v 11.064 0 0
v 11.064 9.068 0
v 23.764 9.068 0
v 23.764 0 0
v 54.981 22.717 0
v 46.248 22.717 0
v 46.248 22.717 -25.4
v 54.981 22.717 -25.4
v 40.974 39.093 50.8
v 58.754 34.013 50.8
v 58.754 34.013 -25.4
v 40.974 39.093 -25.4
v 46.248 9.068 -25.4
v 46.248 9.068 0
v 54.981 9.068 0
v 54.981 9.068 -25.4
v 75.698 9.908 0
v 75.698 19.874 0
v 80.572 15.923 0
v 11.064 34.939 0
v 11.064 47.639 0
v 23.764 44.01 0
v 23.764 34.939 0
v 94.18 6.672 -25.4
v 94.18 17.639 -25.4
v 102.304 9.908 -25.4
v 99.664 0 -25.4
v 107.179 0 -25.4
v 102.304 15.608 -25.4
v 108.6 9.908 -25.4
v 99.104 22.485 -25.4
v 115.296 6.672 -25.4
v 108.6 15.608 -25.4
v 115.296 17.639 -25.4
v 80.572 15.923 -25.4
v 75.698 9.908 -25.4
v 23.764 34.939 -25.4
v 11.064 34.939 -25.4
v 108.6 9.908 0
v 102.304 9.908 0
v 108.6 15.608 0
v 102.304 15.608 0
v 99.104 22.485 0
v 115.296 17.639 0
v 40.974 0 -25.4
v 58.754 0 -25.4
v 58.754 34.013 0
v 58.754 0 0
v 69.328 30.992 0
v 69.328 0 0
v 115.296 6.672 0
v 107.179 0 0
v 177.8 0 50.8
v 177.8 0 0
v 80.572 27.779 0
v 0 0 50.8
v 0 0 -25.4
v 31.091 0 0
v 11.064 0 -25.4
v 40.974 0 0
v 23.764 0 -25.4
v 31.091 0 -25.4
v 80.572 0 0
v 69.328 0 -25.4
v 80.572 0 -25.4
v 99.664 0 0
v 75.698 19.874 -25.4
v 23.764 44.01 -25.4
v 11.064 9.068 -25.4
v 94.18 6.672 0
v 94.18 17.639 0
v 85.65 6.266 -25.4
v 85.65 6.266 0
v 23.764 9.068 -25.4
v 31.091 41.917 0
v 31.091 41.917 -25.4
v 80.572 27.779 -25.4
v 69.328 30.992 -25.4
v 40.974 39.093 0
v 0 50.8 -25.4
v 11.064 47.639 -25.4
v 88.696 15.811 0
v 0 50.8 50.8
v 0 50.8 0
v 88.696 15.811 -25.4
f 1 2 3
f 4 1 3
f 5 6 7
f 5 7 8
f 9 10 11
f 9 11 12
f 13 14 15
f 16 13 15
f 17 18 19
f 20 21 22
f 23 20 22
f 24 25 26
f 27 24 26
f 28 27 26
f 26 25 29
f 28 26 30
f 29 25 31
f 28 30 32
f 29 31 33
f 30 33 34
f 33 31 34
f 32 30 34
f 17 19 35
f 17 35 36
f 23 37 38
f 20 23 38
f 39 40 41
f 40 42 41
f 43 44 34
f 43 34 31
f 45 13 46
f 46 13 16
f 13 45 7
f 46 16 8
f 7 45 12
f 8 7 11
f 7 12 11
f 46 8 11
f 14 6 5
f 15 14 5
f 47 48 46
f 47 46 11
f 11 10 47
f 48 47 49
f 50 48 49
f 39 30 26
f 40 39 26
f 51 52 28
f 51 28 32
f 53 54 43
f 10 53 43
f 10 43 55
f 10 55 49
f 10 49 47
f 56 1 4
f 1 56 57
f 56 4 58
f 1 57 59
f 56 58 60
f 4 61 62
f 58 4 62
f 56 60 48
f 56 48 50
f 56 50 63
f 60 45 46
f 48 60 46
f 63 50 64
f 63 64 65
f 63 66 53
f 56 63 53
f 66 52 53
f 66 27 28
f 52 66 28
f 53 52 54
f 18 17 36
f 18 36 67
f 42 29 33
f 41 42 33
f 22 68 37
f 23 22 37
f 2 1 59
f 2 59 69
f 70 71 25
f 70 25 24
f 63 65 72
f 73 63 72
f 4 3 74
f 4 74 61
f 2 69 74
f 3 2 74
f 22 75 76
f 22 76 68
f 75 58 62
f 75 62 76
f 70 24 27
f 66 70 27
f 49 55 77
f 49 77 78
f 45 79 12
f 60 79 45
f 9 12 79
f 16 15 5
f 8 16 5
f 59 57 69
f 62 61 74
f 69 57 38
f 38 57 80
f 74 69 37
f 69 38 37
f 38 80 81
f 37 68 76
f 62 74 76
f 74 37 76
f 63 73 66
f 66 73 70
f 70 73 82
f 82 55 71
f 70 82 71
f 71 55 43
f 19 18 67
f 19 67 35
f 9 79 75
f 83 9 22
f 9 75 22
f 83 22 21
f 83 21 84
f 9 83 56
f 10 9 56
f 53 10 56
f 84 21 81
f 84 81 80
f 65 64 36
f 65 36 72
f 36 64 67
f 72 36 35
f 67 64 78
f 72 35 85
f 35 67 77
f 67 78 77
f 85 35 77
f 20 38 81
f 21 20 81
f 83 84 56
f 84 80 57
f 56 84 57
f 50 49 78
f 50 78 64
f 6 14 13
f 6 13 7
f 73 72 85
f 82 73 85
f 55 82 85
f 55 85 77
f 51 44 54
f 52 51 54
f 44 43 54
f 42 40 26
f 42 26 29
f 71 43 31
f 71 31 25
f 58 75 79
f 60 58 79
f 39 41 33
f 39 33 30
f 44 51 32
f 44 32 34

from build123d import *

# Parameters (mm, degrees)
F1_DEPTH = 50.8
F2_W     = 8.733455
F2_H     = 13.649156
F3_DEPTH = 76.2


with BuildPart() as f1:
    # F0 (on Top) → F1 (new body)
    with BuildSketch(Plane.XY):
        Polygon((0, 50.8), (0, 0), (177.8, 0), align=None)
    extrude(amount=F1_DEPTH)

    # F2 (on face) → F3 (join)
    with BuildSketch(Plane.XY.offset(50.8)):
        Polygon((11.064442, 34.938731), (11.064442, 47.638731), (0, 50.8), (0, 0), (11.064442, 0), (11.064442, 9.0678), (23.764442, 9.0678), (23.764442, 0), (31.091255, 0), (31.091255, 41.916784), (23.764442, 44.010159), (23.764442, 34.938731), align=None)
        Polygon((58.754327, 34.01305), (40.974327, 39.09305), (40.974327, 0), (58.754327, 0), align=None)
        with Locations((50.614247, 15.892378)):
            Rectangle(F2_W, F2_H, mode=Mode.SUBTRACT)
        Polygon((80.572039, 27.779417), (69.328356, 30.991898), (69.328356, 0), (80.572039, 0), (85.649624, 6.265562), (88.696182, 15.811432), align=None)
        Polygon((75.697549, 9.908289), (75.697549, 15.495949), (75.697549, 19.873505), (80.572039, 15.923239), align=None, mode=Mode.SUBTRACT)
        Polygon((115.295707, 17.639365), (99.104117, 22.484538), (94.17998, 17.639365), (94.17998, 9.908289), (94.17998, 6.67177), (99.663779, 0), (107.178614, 0), (115.295707, 6.67177), (115.295707, 15.608329), align=None)
        Polygon((102.304123, 9.908289), (102.304123, 12.764879), (102.304123, 15.608329), (108.600341, 15.608329), (108.600341, 9.908289), align=None, mode=Mode.SUBTRACT)
    extrude(amount=-F3_DEPTH)


solid = f1.part
